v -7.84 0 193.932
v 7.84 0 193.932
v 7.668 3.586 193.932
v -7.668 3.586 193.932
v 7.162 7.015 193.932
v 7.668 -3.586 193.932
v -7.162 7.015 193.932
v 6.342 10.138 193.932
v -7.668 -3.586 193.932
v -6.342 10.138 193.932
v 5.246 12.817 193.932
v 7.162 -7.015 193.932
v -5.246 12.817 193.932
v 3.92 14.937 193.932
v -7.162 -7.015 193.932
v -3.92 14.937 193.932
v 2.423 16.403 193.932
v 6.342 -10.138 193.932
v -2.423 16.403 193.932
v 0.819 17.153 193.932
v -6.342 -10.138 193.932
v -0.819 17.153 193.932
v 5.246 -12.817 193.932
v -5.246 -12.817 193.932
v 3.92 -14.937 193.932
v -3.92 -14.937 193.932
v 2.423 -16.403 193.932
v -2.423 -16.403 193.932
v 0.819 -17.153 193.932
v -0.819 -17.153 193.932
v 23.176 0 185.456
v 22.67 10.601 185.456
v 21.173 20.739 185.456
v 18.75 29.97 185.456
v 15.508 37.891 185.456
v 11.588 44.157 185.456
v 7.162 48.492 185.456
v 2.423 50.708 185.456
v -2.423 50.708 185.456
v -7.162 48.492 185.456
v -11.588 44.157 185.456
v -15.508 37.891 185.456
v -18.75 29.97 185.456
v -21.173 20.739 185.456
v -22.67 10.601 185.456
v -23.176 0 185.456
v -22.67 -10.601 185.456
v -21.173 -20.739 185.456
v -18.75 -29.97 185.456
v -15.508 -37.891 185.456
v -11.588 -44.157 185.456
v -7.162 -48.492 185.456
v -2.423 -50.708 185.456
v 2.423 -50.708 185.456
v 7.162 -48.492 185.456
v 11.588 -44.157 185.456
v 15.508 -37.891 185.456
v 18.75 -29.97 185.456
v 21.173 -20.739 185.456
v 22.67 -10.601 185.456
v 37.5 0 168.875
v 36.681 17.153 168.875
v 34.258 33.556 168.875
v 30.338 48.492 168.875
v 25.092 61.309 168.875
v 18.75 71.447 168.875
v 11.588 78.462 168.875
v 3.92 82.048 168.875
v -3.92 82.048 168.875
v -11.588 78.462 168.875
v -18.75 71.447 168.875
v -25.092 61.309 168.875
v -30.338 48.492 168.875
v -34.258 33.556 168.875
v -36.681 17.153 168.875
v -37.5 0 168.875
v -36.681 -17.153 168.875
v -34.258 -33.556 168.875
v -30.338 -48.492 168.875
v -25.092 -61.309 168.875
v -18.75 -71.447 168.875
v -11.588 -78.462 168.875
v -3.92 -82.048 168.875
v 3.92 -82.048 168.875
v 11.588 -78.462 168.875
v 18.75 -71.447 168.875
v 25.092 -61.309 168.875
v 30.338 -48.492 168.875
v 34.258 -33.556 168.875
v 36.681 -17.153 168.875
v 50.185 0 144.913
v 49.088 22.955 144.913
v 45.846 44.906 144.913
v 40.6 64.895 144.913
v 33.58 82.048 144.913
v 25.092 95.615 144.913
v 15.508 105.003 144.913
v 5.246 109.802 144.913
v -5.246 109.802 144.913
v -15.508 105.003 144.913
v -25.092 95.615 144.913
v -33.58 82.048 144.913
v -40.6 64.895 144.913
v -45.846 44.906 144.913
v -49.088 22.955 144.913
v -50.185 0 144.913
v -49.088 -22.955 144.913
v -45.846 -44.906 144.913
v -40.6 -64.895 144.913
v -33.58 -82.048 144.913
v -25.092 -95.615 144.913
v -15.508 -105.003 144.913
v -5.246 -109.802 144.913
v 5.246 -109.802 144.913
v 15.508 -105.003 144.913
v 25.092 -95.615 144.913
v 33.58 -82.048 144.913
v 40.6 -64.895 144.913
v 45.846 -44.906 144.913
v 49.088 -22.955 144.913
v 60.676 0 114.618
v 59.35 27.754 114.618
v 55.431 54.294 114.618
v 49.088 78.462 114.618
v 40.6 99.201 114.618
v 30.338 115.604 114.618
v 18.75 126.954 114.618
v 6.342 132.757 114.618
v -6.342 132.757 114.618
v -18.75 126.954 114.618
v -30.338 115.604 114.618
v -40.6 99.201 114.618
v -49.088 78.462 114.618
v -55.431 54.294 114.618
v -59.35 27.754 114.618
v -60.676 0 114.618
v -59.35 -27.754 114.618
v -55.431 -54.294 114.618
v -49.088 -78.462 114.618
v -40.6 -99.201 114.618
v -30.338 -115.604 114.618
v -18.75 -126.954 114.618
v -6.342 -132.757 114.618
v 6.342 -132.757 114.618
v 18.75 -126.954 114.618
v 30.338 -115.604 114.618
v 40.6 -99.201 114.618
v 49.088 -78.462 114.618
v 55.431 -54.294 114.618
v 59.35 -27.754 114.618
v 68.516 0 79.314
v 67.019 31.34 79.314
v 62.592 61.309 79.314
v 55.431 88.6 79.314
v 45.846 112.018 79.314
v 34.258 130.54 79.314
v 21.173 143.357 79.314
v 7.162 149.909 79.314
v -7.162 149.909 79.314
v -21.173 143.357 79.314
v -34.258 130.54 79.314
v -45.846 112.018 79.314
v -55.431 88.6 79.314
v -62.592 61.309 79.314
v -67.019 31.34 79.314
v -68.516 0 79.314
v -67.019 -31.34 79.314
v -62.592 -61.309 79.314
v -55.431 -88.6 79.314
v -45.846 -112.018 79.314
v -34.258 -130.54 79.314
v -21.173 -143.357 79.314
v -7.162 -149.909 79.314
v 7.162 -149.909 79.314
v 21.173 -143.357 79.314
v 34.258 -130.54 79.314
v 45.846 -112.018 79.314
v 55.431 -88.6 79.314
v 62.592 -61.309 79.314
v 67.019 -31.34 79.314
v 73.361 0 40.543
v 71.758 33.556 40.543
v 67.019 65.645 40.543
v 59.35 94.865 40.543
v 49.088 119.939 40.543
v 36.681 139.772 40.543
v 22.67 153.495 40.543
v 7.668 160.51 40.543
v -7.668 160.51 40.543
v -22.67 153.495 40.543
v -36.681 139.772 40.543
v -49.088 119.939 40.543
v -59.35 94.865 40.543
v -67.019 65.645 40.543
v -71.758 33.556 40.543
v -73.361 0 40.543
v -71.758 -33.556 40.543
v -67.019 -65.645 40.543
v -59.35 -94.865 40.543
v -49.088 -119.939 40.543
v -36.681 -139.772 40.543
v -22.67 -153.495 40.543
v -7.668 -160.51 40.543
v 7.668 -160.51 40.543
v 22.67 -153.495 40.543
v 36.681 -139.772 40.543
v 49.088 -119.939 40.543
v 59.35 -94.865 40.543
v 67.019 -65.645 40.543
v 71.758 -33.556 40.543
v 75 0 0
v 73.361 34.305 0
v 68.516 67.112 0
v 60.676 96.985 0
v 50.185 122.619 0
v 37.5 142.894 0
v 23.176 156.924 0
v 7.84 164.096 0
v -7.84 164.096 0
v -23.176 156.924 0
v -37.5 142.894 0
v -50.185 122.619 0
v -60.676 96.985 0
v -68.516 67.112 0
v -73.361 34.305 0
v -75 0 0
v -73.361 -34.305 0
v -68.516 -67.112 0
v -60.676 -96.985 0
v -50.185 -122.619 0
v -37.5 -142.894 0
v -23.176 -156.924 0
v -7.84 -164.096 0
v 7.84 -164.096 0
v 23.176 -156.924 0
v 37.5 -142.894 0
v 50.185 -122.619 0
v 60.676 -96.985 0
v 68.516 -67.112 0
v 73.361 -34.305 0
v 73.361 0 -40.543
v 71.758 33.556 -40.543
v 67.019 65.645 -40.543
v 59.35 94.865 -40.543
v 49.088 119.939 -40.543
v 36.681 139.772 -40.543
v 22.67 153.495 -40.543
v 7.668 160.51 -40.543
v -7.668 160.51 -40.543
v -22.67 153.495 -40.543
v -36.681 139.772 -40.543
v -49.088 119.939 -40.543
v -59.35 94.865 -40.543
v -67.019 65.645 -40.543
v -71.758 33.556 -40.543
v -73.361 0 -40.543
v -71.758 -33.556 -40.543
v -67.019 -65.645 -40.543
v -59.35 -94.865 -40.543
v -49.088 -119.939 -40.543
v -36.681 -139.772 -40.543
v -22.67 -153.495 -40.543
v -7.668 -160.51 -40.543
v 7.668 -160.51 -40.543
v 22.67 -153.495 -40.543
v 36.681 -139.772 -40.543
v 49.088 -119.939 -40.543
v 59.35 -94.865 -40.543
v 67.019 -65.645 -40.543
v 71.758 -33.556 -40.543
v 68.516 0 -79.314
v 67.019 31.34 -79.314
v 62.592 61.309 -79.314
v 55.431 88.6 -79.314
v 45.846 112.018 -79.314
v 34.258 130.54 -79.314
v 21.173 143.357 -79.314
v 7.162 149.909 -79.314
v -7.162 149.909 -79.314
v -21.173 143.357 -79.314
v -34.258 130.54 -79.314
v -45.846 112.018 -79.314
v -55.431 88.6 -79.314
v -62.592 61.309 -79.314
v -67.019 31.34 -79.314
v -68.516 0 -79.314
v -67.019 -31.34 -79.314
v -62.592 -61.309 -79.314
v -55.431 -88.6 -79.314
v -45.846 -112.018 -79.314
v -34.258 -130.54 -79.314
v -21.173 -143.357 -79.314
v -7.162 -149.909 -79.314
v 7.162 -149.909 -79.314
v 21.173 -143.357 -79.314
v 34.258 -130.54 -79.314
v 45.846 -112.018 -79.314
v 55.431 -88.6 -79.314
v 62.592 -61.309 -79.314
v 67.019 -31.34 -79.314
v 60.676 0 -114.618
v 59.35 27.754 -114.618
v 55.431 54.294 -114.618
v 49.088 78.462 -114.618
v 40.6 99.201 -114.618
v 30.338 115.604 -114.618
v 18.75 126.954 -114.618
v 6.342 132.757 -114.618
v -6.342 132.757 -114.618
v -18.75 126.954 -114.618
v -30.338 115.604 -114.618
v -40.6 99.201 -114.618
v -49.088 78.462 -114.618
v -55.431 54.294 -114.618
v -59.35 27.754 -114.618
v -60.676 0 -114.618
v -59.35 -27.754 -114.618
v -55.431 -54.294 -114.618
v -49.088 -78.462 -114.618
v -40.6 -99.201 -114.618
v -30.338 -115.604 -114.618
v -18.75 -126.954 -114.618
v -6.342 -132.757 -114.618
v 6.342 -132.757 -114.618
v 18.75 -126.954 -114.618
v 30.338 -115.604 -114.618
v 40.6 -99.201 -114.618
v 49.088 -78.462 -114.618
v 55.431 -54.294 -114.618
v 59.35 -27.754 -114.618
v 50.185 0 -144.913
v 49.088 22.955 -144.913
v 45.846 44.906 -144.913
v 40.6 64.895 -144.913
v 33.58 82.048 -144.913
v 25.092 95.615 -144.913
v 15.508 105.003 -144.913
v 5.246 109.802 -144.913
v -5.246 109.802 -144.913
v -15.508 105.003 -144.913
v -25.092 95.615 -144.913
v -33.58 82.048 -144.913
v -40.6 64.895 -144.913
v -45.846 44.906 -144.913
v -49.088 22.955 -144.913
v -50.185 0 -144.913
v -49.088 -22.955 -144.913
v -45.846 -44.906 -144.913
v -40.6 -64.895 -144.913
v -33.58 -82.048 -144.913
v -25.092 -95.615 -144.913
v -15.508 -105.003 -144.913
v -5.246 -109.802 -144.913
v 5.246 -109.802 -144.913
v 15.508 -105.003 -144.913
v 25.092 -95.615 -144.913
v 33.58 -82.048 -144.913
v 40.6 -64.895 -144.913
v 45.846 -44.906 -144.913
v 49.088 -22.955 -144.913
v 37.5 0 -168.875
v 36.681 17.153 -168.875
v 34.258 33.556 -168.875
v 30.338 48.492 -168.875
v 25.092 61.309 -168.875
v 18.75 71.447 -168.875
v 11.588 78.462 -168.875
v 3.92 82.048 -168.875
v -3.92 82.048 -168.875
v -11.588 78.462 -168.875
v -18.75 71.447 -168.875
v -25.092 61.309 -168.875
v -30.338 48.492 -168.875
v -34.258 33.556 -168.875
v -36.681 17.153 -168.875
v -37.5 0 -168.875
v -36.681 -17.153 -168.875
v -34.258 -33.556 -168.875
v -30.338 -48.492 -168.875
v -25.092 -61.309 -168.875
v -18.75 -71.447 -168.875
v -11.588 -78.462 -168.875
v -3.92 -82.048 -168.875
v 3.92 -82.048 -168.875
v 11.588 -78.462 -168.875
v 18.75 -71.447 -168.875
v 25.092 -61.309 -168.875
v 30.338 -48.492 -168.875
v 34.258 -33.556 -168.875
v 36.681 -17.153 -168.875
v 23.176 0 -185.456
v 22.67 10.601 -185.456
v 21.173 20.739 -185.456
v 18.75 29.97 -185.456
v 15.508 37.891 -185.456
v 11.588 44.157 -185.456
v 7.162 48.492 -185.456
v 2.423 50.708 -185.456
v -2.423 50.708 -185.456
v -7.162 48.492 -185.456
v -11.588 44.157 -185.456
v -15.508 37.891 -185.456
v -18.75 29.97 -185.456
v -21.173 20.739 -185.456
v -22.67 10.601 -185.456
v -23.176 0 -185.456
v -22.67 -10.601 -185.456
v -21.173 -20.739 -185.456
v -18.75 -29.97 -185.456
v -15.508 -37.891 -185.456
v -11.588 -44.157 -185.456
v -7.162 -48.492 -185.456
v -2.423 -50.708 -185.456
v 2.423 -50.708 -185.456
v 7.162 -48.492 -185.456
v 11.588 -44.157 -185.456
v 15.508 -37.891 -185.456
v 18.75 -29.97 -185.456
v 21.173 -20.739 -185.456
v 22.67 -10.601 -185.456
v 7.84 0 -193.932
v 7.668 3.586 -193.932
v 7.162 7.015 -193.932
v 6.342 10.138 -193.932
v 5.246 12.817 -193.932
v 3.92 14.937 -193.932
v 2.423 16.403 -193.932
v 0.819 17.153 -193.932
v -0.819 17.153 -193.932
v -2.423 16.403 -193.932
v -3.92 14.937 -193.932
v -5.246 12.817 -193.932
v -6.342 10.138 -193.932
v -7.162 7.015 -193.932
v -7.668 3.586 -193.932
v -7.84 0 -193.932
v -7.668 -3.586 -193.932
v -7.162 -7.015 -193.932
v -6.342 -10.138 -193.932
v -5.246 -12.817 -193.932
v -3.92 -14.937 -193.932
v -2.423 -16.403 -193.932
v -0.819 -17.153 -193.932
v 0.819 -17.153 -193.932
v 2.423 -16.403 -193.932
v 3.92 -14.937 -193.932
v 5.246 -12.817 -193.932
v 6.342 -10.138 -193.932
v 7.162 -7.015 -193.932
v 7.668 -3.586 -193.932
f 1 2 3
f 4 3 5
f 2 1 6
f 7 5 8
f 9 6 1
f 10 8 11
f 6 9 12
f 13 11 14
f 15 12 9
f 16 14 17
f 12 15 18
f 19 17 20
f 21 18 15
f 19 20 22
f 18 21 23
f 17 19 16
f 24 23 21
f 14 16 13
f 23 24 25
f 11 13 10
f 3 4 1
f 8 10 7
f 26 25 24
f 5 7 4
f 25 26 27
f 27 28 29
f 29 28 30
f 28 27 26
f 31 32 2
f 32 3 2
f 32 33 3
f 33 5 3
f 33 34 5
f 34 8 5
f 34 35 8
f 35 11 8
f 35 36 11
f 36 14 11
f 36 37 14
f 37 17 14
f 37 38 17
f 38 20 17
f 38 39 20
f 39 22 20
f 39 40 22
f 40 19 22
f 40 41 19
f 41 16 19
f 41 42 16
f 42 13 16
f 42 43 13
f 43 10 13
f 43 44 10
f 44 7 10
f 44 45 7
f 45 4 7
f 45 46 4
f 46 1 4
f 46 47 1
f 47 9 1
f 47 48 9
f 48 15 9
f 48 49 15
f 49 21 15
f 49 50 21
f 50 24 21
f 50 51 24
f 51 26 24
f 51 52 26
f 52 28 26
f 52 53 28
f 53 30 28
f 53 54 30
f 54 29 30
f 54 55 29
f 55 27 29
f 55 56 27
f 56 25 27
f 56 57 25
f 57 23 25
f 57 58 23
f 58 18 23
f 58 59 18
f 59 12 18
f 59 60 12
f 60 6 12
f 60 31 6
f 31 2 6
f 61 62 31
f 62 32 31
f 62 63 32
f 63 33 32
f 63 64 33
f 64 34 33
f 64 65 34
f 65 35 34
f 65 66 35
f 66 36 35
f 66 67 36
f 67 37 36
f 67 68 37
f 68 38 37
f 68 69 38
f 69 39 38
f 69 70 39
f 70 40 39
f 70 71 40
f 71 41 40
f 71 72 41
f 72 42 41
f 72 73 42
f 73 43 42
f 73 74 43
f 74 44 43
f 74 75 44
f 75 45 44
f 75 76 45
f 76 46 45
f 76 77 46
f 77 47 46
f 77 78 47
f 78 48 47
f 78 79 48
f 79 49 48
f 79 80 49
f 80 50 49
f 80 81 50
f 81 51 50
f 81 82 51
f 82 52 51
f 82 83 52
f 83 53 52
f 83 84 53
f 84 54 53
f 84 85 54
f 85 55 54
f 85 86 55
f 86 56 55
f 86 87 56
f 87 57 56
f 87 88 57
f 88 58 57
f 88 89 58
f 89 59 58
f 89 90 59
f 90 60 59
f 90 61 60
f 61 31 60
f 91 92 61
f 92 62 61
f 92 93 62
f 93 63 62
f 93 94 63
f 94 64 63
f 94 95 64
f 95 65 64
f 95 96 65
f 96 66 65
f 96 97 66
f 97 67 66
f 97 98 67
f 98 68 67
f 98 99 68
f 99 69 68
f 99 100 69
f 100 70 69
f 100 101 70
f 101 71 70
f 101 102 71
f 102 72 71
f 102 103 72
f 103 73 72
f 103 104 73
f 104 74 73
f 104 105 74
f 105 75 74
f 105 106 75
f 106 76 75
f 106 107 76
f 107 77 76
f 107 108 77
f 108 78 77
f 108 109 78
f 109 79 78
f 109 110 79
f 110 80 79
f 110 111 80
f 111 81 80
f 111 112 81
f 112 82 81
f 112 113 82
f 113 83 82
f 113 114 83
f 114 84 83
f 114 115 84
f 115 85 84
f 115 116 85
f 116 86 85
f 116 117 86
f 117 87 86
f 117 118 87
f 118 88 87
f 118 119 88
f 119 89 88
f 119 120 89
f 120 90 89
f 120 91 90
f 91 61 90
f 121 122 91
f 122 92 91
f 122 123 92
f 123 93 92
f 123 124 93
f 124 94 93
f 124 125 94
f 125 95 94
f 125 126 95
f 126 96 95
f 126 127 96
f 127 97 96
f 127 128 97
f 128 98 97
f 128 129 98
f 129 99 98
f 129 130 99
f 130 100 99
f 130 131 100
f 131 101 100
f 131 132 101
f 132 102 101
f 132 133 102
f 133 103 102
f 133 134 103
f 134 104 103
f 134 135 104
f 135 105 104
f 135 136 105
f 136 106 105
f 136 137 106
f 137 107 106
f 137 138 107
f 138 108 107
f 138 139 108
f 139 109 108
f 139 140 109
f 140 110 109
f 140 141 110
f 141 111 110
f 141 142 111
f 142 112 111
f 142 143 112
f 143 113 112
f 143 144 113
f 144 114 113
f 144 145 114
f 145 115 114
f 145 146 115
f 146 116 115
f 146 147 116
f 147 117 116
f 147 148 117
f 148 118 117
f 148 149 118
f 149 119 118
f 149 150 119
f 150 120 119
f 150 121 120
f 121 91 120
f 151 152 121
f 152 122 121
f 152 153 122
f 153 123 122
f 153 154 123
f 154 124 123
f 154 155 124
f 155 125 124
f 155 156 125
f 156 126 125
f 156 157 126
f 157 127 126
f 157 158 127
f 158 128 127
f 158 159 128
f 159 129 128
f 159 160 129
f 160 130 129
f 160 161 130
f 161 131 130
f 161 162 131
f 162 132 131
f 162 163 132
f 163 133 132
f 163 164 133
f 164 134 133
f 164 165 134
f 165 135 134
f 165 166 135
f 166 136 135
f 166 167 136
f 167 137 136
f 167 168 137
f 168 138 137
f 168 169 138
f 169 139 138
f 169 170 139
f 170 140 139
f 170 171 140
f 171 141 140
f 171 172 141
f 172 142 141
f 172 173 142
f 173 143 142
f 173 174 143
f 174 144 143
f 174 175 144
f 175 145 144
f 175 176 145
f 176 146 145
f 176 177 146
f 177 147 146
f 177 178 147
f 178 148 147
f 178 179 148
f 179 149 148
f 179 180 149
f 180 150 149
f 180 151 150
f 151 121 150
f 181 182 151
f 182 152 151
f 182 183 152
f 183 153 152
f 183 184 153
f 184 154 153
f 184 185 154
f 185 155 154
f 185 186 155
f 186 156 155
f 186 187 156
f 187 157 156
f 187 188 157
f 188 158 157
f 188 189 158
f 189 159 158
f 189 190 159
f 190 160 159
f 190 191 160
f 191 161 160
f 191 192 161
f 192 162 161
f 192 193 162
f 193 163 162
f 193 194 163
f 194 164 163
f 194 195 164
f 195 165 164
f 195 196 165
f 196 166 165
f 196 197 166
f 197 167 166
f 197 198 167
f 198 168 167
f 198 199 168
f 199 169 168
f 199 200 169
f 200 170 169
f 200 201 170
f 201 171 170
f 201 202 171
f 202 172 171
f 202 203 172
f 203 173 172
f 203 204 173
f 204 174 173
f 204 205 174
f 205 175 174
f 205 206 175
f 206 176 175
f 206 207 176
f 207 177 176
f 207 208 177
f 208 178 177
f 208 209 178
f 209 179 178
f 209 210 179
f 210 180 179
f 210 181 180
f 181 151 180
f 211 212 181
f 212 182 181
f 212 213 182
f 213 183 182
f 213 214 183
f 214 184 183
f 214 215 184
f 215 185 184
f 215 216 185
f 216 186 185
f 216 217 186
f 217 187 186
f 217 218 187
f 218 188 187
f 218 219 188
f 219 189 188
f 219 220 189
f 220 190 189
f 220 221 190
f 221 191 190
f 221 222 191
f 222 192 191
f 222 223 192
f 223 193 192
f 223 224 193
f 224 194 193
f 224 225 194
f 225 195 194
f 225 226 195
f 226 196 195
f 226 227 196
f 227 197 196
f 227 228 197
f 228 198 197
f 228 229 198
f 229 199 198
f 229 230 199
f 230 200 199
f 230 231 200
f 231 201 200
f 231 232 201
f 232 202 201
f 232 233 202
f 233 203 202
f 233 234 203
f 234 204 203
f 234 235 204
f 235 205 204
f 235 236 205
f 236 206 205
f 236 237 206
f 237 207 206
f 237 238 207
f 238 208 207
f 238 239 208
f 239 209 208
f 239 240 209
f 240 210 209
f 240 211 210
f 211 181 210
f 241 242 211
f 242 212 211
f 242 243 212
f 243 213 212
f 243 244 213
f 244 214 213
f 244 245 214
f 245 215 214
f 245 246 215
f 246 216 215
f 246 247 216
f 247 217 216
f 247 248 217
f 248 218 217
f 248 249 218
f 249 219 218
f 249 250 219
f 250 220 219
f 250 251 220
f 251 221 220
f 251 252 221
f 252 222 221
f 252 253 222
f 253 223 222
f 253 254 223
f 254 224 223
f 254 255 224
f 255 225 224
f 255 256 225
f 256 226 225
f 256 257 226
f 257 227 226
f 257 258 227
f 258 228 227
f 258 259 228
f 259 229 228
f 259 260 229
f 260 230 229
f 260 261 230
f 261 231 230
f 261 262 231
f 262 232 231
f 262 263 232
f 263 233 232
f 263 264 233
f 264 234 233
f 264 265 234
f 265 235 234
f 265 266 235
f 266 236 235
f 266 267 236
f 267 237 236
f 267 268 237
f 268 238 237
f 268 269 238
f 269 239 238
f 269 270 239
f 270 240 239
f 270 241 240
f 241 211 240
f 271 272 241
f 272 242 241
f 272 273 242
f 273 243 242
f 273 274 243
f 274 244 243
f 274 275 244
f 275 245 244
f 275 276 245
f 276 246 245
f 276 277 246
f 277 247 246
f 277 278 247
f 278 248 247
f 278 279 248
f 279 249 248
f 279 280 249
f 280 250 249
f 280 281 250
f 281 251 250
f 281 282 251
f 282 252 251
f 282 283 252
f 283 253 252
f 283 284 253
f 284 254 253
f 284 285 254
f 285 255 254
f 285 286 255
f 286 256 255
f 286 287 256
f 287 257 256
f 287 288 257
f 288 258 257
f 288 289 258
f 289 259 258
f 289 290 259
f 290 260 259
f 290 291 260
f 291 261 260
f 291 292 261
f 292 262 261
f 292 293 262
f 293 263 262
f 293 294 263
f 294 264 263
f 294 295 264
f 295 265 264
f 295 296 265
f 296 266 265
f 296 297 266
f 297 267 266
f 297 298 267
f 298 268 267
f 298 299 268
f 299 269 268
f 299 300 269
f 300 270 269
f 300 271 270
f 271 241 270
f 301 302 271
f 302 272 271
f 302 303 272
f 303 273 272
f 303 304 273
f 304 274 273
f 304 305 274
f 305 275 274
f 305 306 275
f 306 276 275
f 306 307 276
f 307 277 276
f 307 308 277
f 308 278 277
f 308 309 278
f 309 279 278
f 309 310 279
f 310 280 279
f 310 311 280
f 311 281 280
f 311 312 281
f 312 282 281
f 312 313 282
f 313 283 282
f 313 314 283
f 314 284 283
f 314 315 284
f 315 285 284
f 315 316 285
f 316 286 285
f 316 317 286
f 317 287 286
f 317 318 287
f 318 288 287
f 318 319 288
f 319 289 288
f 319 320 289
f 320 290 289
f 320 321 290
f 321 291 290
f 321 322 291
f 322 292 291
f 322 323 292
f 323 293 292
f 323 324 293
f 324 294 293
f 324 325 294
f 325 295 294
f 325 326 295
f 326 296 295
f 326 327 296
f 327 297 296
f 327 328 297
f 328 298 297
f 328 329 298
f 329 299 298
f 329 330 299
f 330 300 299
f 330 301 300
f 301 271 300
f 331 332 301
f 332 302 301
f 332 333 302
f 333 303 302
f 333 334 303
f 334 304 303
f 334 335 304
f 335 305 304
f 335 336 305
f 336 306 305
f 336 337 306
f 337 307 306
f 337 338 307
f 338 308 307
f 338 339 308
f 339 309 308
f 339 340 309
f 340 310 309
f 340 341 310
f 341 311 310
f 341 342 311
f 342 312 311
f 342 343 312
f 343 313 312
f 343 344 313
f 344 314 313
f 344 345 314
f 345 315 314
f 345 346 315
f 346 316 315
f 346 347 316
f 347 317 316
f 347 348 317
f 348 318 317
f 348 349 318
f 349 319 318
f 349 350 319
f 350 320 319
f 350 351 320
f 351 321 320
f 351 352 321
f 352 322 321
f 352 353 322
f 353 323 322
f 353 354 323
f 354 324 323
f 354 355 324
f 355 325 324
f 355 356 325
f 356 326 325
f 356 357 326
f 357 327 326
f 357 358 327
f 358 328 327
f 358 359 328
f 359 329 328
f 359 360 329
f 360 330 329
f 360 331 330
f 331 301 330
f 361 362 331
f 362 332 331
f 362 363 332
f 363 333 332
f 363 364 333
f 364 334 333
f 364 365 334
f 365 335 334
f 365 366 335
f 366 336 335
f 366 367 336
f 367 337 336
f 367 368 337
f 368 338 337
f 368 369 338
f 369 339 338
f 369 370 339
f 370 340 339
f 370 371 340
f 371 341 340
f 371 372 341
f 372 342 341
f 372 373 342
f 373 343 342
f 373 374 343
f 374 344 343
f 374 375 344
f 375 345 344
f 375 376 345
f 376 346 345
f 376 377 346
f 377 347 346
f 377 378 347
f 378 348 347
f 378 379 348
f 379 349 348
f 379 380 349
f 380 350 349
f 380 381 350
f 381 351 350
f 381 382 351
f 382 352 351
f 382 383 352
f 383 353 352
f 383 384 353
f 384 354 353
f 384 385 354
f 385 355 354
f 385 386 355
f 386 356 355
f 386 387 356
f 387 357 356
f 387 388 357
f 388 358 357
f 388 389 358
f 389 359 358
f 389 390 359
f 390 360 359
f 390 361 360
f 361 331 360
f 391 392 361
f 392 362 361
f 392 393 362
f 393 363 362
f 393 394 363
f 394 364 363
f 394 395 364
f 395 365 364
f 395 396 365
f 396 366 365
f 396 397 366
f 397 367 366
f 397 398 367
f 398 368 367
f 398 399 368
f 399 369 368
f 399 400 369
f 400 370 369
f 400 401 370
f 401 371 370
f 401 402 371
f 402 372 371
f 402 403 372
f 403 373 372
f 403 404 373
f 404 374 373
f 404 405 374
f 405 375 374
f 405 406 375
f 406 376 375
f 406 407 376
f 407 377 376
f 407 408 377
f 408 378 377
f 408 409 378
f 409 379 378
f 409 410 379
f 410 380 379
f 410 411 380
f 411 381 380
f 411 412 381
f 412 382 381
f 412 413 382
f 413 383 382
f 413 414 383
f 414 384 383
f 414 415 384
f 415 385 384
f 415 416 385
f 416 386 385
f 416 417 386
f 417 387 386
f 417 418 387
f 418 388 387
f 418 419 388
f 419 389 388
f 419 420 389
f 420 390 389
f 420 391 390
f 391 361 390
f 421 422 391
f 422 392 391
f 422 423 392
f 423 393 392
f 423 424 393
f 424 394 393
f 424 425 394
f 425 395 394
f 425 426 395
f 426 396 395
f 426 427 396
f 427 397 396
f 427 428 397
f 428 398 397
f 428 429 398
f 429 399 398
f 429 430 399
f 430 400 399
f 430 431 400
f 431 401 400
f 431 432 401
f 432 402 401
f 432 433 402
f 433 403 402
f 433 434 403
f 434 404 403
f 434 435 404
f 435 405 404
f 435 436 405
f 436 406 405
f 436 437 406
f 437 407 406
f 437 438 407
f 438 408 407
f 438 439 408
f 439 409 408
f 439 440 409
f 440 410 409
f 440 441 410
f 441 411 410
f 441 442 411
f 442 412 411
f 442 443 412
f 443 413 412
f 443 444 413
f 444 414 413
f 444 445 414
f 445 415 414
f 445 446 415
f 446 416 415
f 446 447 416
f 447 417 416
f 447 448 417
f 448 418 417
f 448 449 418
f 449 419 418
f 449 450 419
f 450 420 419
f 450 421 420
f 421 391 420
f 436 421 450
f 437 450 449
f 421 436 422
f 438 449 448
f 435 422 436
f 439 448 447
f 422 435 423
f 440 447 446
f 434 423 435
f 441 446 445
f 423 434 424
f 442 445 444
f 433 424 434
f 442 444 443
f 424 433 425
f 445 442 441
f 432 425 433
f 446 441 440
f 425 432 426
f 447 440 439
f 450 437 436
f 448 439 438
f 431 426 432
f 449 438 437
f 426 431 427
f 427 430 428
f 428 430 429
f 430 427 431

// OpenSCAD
// Generated by SolidPython 1.0.1 on 2020-07-29 00:46:46


scale(v = [5, 11, 13]) {
	sphere(r = 15);
}
/***********************************************
*********      SolidPython code:      **********
************************************************
 
# import packages: SolidPython
from solid import *
from solid.utils import *
from itertools import chain, combinations, permutations


class Resize:

    def __init__(self, scad_file):
        self.scad_file = scad_file
        #self.scad_file = import_scad(scad_file)
        # cone/cylinder param:
        self.r1 = 0
        self.r2 = 0
        self.h = 0
        # rectangular prism param:
        self.w = 0
        self.l = 0
        # ellipse param:
        self.r = 0

    # import OpenScad code (file name corresponds to shape)


    # classify shape + parameters
    def assign(self, param1, param2, param3):
        if self.scad_file == 'cone.scad':
            self.r1 = param1
            self.r2 = param2
            self.h = param3
        elif self.scad_file == 'cylinder.scad':
            self.r1 = param1
            self.r2 = param2
            self.h = param3
        elif self.scad_file == 'rectangularPrism.scad':
            self.h = param1
            self.l = param2
            self.w = param3
        else:
            self.r = param1
            self.h = param2

    # resize parameters
    def iterate(self):
        x = range(3, 20, 2)
        i = 1
        if self.scad_file == 'cone.scad':
            tempList = list(permutations(x, 2))
            for temp in tempList:
                param1 = temp[0]
                param2 = temp[1]
                filepath = 'produced_scad_files/' + 'cone' + str(param1) + '_' + str(param2) + '_' + '.scad'
                scad_render_to_file(cylinder(h=param1, r1=param2, r2=0), filepath)

        elif self.scad_file == 'cylinder.scad':
            tempList = list(permutations(x, 3))
            for temp in tempList:
                param1 = temp[0]
                param2 = temp[1]
                filepath = 'produced_scad_files/' + 'cylinder' + str(param1) + '_' + str(param2) + '_' + '.scad'
                scad_render_to_file(cylinder(h=param1, r1=param2, r2=param2), filepath)

        elif self.scad_file == 'rectangularPrism.scad':
            tempList = list(permutations(x, 3))
            for temp in tempList:
                param1 = temp[0]
                param2 = temp[1]
                param3 = temp[2]
                filepath = 'produced_scad_files/' + 'rectangularPrism' + str(param1) + '_' + str(param2) + '_' + str(
                    param3) + '.scad'
                scad_render_to_file(cube(size=(param1, param2, param3)), filepath)

        elif self.scad_file == 'ellipse.scad':
            tempList = list(permutations(x, 4))
            for temp in tempList:
                param1 = temp[0]
                param2 = temp[1]
                param3 = temp[2]
                param4 = temp[3]
                filepath = 'produced_scad_files/' + 'ellipse' + str(param1) + '_' + str(param2) + '_' + str(param3) + '_' + str(param4) + '.scad'
                scad_render_to_file(scale([param1, param2, param3])(sphere(r=param4)), filepath)

    def render_to_scadfile(self):
        scad_render_to_file(scad, 'example.scad') 
 
************************************************/
